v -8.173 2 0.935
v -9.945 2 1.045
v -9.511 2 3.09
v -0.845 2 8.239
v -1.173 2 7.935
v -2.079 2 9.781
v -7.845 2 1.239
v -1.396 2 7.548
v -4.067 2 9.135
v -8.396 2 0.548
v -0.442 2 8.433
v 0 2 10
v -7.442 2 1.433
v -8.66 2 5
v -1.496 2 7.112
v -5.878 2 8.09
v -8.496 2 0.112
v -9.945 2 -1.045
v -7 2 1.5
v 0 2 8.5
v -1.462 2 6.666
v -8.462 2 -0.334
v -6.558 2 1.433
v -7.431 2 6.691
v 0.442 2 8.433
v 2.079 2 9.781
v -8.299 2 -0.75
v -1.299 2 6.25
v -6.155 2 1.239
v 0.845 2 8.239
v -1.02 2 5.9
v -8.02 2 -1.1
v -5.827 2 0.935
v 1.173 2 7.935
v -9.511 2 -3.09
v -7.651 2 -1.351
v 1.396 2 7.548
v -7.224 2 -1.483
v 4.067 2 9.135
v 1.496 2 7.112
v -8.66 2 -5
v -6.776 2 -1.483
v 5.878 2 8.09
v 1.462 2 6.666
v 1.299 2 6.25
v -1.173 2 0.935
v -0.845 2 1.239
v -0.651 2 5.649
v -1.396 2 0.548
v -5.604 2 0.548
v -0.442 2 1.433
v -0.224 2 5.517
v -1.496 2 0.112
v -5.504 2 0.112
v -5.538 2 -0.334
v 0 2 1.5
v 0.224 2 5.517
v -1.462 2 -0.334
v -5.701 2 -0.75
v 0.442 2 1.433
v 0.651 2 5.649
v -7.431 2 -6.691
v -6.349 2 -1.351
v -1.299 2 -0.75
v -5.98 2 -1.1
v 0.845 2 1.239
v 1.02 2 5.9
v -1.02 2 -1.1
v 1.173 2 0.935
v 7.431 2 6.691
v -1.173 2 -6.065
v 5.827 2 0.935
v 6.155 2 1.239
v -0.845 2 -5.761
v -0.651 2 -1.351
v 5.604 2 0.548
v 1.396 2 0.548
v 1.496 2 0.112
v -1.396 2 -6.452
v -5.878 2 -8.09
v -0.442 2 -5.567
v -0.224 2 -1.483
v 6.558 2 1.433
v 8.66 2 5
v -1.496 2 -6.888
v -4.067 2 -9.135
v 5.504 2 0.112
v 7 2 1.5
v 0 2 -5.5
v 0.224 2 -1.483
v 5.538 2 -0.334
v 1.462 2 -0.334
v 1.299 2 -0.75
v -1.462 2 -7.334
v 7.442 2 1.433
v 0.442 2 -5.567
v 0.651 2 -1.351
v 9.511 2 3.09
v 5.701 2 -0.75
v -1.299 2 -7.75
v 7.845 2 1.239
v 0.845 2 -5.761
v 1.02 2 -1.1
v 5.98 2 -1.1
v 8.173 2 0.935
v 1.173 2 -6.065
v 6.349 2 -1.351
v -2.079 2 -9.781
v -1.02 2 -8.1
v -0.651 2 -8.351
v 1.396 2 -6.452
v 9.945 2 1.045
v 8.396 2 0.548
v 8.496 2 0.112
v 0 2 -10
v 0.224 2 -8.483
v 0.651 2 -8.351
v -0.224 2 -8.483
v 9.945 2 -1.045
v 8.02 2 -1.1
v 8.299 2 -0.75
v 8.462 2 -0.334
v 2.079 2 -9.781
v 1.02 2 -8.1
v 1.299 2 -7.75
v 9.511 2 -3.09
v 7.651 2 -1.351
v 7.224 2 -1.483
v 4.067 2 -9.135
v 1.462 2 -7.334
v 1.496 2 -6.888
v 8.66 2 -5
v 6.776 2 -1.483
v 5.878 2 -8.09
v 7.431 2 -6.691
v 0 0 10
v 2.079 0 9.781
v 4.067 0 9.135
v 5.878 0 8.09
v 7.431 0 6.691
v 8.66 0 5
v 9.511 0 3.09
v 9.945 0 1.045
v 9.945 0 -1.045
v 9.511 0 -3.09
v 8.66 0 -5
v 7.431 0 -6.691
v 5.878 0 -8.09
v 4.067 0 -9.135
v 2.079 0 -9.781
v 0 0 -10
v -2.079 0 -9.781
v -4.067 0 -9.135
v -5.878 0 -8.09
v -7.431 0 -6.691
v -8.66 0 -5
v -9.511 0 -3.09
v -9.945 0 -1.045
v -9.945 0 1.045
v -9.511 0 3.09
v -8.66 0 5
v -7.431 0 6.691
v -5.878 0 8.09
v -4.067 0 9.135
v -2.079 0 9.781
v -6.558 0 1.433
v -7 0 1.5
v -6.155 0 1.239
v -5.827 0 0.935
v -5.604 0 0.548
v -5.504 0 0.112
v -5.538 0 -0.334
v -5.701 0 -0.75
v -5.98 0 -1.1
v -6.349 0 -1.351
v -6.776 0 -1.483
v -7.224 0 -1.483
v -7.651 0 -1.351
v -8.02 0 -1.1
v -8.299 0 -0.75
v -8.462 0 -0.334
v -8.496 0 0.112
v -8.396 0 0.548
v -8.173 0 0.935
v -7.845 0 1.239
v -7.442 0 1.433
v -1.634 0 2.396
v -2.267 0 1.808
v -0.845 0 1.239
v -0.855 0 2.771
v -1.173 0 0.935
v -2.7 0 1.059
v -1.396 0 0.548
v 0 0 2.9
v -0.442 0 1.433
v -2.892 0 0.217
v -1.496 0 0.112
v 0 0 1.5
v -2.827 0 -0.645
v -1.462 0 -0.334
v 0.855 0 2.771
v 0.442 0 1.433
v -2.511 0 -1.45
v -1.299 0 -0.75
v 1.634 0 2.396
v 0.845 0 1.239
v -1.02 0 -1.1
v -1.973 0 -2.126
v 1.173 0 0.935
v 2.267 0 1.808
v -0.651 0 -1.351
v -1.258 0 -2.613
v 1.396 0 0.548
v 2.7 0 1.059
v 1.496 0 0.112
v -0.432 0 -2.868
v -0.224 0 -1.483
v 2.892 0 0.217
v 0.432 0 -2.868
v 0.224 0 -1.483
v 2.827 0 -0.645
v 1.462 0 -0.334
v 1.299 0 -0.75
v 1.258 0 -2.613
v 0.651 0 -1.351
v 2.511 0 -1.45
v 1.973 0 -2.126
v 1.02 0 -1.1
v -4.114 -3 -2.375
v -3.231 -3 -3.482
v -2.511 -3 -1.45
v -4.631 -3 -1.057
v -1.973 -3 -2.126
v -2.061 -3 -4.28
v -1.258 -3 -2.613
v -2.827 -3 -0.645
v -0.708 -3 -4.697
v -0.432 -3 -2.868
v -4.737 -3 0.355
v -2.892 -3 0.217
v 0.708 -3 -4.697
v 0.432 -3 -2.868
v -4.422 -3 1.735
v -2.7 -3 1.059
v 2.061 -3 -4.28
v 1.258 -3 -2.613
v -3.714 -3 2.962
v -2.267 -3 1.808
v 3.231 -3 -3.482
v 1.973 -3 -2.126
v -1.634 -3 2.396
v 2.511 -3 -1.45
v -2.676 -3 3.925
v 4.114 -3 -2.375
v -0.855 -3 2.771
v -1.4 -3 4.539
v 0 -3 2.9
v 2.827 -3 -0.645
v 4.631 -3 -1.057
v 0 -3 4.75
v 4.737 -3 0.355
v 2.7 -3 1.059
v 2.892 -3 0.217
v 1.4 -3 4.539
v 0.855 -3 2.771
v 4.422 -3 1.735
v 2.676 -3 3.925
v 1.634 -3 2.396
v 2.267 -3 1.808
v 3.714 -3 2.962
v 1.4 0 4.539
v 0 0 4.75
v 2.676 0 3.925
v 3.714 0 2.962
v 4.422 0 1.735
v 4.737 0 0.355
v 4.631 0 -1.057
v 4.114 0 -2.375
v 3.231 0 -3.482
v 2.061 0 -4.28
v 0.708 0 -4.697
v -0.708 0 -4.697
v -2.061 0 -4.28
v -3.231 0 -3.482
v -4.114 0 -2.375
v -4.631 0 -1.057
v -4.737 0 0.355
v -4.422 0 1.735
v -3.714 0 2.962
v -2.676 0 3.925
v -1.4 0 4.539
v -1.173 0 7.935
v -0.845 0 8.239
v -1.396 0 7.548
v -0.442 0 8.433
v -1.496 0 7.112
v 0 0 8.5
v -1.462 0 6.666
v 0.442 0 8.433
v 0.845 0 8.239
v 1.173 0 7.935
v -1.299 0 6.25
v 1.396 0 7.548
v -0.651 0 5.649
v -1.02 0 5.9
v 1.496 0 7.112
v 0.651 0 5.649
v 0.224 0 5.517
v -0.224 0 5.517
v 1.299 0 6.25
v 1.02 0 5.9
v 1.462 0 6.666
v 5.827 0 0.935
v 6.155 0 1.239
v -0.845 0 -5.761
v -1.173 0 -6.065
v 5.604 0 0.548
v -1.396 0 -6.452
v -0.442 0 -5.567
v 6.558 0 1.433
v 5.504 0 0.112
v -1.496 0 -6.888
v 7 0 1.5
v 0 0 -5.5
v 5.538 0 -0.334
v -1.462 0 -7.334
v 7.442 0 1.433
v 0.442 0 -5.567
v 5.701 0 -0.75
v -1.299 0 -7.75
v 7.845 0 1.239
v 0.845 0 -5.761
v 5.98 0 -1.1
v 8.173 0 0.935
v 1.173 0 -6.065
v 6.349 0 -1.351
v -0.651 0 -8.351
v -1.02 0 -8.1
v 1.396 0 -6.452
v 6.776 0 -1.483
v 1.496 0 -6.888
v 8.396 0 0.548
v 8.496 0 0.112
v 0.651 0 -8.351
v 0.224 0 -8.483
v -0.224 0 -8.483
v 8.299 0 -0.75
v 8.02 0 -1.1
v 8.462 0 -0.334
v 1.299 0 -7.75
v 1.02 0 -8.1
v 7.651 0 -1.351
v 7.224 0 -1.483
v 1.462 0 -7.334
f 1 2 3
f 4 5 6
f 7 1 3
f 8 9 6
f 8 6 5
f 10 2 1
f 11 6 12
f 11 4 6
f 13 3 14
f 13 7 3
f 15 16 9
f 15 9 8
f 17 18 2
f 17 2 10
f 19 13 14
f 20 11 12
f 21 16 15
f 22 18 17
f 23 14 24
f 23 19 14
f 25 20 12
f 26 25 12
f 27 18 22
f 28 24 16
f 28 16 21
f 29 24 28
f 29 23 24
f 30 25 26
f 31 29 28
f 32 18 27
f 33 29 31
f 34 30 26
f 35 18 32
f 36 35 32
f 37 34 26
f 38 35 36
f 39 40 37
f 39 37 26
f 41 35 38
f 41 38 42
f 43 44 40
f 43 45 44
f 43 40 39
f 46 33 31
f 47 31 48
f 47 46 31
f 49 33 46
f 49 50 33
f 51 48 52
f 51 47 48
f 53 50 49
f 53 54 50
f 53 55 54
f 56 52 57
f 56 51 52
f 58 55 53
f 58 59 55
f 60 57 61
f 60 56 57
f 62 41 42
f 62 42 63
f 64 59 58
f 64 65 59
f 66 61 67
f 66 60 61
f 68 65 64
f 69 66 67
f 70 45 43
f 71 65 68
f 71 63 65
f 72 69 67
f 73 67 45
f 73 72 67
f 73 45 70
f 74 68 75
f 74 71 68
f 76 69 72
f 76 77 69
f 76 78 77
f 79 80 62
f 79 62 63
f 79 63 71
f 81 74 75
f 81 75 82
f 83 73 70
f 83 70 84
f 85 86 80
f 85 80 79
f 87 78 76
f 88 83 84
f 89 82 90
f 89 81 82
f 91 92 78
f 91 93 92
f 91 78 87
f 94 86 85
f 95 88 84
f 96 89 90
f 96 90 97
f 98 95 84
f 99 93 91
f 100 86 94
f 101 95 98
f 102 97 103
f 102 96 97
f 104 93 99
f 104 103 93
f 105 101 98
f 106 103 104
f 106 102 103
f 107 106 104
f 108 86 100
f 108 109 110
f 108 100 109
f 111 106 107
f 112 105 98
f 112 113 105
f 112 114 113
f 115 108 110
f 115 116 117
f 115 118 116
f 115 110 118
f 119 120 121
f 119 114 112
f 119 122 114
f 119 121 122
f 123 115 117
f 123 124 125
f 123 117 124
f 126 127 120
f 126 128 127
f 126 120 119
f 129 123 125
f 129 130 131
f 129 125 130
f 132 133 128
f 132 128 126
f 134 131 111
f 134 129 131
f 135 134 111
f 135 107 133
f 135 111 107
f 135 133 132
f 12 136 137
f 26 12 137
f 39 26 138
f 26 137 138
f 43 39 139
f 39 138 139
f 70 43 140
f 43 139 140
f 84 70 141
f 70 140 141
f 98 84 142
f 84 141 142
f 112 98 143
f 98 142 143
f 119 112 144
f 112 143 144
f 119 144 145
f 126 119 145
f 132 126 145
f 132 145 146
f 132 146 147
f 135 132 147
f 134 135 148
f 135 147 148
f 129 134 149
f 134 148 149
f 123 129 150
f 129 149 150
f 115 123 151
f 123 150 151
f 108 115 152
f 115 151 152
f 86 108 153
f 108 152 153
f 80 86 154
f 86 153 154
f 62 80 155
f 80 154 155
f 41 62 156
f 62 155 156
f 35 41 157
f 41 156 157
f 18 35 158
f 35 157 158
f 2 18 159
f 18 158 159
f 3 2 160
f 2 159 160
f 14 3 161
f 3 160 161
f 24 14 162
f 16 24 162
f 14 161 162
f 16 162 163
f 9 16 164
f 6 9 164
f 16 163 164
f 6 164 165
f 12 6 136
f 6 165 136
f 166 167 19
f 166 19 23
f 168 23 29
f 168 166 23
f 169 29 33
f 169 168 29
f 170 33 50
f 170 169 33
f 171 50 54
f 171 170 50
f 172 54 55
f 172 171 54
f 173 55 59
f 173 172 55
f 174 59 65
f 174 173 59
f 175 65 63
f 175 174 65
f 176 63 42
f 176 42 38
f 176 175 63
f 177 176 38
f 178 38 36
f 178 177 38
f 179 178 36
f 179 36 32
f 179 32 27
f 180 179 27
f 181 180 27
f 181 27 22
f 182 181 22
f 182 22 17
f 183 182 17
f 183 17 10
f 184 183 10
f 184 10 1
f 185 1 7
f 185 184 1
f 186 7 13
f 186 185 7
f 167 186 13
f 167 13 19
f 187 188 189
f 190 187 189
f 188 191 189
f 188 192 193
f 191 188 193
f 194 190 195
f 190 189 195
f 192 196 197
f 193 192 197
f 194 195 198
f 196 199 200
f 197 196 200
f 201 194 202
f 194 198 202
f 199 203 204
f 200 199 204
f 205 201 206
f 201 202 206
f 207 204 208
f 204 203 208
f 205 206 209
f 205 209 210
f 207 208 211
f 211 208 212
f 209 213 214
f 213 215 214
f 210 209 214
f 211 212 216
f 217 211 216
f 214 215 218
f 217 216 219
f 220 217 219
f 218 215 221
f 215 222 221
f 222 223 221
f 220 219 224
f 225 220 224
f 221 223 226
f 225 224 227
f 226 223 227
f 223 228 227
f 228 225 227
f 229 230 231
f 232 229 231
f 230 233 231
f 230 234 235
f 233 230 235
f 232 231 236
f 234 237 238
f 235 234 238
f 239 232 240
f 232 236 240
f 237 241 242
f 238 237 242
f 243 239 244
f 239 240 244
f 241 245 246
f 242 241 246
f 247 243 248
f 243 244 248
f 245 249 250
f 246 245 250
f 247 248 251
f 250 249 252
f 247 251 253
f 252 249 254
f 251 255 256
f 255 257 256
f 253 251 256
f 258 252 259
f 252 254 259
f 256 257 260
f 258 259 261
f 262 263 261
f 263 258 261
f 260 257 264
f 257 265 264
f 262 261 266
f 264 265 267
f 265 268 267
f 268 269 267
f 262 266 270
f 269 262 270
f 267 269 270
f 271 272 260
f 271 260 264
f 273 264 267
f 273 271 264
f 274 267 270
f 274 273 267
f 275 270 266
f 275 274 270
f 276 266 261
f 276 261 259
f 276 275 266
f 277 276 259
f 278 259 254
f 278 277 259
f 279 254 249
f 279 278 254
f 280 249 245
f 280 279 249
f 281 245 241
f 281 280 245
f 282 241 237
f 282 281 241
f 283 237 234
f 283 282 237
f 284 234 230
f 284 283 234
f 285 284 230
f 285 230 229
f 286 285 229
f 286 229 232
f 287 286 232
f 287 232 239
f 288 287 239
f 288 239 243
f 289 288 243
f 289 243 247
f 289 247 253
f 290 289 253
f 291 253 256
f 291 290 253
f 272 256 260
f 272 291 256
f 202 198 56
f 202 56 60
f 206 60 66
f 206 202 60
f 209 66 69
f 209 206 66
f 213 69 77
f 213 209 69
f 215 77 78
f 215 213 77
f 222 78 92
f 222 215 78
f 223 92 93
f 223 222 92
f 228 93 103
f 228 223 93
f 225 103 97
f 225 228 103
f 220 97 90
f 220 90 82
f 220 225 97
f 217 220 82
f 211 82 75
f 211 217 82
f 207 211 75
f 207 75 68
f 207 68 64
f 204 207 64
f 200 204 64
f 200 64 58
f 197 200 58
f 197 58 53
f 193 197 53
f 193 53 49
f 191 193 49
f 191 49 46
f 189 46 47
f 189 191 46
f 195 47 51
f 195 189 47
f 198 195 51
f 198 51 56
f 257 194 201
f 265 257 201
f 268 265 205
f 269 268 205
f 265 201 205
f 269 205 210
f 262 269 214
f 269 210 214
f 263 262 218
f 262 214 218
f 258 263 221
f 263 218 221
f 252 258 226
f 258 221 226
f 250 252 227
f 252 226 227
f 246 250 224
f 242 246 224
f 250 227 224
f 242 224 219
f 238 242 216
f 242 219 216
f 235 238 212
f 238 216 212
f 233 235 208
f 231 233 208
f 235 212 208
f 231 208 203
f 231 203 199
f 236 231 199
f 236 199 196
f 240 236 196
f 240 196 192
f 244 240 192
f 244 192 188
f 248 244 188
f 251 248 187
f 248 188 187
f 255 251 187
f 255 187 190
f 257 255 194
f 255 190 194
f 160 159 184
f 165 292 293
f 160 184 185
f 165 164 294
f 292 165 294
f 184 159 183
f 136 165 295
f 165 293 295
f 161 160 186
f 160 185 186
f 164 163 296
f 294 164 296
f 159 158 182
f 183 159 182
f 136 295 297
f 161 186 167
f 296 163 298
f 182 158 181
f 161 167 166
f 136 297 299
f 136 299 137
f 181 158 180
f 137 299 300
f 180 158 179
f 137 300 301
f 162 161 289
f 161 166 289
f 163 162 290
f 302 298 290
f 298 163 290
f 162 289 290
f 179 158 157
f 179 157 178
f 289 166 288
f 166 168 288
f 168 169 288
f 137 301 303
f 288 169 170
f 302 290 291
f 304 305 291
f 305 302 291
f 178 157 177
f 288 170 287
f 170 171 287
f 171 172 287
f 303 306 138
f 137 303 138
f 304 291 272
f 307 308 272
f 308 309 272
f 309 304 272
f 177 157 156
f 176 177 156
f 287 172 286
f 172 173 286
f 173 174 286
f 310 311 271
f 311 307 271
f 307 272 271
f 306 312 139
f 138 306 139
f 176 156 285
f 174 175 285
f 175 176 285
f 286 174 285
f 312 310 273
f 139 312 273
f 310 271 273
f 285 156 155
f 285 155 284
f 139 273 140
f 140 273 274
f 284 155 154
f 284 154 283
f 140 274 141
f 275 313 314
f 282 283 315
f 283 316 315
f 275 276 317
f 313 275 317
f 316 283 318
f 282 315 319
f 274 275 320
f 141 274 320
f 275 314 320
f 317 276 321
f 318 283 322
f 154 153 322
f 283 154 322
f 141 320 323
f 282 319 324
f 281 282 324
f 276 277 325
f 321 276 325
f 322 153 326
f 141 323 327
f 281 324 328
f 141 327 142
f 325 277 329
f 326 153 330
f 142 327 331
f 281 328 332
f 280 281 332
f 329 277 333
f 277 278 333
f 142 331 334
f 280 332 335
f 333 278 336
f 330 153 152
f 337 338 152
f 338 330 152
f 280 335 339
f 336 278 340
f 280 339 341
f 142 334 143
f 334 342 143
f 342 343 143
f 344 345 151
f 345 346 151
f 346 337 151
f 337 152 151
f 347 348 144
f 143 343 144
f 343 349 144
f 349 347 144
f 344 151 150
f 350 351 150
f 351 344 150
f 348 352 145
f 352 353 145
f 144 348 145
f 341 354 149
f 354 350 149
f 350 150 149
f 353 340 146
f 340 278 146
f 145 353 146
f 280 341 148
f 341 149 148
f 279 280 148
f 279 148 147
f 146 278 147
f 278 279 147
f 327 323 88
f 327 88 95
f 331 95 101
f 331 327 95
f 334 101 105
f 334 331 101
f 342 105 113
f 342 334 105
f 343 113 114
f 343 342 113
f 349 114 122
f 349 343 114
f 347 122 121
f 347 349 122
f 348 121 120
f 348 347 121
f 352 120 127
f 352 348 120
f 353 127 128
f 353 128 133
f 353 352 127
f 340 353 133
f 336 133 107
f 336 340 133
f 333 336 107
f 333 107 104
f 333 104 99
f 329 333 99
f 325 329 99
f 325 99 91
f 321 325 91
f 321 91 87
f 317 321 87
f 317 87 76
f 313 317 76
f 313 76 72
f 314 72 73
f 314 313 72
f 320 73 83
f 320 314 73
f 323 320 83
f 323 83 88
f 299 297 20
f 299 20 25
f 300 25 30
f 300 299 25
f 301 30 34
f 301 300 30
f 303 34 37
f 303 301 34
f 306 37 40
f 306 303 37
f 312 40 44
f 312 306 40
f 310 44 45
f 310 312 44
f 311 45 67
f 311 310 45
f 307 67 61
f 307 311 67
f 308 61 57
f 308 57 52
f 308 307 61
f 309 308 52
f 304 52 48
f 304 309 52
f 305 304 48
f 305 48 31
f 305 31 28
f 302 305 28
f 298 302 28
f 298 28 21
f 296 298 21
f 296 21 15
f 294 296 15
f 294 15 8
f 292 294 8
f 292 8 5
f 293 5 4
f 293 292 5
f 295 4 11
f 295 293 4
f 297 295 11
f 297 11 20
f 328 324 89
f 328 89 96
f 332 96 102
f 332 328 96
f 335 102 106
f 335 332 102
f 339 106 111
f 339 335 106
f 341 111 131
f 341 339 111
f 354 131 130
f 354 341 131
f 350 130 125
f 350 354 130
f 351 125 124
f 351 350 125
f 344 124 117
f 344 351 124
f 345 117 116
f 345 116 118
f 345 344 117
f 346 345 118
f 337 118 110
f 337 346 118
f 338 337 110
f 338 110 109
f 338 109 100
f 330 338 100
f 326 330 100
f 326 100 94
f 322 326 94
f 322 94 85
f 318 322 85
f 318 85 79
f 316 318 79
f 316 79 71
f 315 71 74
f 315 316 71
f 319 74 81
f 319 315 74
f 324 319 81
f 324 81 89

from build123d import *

# Parameters (mm, degrees)
SKETCH1_R           = 10
SKETCH1_R_2         = 1.5
BOSS_EXTRUDE1_DEPTH = 2
SKETCH1_3_R         = 4.75
SKETCH1_3_R_2       = 2.9
BOSS_EXTRUDE2_DEPTH = 3


with BuildPart() as part:
    # Sketch1 → Boss-Extrude1 (new body)
    with BuildSketch(Plane(origin=(0, 0, 0), x_dir=(1, 0, 0), z_dir=(0, 1, 0))):
        Circle(SKETCH1_R)
        with Locations((0, -7)):
            Circle(SKETCH1_R_2, mode=Mode.SUBTRACT)
        with Locations((7, 0)):
            Circle(SKETCH1_R_2, mode=Mode.SUBTRACT)
        with Locations((-7, 0)):
            Circle(SKETCH1_R_2, mode=Mode.SUBTRACT)
        with Locations((0, 7)):
            Circle(SKETCH1_R_2, mode=Mode.SUBTRACT)
        Circle(SKETCH1_R_2, mode=Mode.SUBTRACT)
    extrude(amount=BOSS_EXTRUDE1_DEPTH)

    # Sketch1<3> → Boss-Extrude2 (add)
    with BuildSketch(Plane(origin=(0, 0, 0), x_dir=(1, 0, 0), z_dir=(0, 1, 0))):
        Circle(SKETCH1_3_R)
        Circle(SKETCH1_3_R_2, mode=Mode.SUBTRACT)
    extrude(amount=-BOSS_EXTRUDE2_DEPTH)


solid = part.part
